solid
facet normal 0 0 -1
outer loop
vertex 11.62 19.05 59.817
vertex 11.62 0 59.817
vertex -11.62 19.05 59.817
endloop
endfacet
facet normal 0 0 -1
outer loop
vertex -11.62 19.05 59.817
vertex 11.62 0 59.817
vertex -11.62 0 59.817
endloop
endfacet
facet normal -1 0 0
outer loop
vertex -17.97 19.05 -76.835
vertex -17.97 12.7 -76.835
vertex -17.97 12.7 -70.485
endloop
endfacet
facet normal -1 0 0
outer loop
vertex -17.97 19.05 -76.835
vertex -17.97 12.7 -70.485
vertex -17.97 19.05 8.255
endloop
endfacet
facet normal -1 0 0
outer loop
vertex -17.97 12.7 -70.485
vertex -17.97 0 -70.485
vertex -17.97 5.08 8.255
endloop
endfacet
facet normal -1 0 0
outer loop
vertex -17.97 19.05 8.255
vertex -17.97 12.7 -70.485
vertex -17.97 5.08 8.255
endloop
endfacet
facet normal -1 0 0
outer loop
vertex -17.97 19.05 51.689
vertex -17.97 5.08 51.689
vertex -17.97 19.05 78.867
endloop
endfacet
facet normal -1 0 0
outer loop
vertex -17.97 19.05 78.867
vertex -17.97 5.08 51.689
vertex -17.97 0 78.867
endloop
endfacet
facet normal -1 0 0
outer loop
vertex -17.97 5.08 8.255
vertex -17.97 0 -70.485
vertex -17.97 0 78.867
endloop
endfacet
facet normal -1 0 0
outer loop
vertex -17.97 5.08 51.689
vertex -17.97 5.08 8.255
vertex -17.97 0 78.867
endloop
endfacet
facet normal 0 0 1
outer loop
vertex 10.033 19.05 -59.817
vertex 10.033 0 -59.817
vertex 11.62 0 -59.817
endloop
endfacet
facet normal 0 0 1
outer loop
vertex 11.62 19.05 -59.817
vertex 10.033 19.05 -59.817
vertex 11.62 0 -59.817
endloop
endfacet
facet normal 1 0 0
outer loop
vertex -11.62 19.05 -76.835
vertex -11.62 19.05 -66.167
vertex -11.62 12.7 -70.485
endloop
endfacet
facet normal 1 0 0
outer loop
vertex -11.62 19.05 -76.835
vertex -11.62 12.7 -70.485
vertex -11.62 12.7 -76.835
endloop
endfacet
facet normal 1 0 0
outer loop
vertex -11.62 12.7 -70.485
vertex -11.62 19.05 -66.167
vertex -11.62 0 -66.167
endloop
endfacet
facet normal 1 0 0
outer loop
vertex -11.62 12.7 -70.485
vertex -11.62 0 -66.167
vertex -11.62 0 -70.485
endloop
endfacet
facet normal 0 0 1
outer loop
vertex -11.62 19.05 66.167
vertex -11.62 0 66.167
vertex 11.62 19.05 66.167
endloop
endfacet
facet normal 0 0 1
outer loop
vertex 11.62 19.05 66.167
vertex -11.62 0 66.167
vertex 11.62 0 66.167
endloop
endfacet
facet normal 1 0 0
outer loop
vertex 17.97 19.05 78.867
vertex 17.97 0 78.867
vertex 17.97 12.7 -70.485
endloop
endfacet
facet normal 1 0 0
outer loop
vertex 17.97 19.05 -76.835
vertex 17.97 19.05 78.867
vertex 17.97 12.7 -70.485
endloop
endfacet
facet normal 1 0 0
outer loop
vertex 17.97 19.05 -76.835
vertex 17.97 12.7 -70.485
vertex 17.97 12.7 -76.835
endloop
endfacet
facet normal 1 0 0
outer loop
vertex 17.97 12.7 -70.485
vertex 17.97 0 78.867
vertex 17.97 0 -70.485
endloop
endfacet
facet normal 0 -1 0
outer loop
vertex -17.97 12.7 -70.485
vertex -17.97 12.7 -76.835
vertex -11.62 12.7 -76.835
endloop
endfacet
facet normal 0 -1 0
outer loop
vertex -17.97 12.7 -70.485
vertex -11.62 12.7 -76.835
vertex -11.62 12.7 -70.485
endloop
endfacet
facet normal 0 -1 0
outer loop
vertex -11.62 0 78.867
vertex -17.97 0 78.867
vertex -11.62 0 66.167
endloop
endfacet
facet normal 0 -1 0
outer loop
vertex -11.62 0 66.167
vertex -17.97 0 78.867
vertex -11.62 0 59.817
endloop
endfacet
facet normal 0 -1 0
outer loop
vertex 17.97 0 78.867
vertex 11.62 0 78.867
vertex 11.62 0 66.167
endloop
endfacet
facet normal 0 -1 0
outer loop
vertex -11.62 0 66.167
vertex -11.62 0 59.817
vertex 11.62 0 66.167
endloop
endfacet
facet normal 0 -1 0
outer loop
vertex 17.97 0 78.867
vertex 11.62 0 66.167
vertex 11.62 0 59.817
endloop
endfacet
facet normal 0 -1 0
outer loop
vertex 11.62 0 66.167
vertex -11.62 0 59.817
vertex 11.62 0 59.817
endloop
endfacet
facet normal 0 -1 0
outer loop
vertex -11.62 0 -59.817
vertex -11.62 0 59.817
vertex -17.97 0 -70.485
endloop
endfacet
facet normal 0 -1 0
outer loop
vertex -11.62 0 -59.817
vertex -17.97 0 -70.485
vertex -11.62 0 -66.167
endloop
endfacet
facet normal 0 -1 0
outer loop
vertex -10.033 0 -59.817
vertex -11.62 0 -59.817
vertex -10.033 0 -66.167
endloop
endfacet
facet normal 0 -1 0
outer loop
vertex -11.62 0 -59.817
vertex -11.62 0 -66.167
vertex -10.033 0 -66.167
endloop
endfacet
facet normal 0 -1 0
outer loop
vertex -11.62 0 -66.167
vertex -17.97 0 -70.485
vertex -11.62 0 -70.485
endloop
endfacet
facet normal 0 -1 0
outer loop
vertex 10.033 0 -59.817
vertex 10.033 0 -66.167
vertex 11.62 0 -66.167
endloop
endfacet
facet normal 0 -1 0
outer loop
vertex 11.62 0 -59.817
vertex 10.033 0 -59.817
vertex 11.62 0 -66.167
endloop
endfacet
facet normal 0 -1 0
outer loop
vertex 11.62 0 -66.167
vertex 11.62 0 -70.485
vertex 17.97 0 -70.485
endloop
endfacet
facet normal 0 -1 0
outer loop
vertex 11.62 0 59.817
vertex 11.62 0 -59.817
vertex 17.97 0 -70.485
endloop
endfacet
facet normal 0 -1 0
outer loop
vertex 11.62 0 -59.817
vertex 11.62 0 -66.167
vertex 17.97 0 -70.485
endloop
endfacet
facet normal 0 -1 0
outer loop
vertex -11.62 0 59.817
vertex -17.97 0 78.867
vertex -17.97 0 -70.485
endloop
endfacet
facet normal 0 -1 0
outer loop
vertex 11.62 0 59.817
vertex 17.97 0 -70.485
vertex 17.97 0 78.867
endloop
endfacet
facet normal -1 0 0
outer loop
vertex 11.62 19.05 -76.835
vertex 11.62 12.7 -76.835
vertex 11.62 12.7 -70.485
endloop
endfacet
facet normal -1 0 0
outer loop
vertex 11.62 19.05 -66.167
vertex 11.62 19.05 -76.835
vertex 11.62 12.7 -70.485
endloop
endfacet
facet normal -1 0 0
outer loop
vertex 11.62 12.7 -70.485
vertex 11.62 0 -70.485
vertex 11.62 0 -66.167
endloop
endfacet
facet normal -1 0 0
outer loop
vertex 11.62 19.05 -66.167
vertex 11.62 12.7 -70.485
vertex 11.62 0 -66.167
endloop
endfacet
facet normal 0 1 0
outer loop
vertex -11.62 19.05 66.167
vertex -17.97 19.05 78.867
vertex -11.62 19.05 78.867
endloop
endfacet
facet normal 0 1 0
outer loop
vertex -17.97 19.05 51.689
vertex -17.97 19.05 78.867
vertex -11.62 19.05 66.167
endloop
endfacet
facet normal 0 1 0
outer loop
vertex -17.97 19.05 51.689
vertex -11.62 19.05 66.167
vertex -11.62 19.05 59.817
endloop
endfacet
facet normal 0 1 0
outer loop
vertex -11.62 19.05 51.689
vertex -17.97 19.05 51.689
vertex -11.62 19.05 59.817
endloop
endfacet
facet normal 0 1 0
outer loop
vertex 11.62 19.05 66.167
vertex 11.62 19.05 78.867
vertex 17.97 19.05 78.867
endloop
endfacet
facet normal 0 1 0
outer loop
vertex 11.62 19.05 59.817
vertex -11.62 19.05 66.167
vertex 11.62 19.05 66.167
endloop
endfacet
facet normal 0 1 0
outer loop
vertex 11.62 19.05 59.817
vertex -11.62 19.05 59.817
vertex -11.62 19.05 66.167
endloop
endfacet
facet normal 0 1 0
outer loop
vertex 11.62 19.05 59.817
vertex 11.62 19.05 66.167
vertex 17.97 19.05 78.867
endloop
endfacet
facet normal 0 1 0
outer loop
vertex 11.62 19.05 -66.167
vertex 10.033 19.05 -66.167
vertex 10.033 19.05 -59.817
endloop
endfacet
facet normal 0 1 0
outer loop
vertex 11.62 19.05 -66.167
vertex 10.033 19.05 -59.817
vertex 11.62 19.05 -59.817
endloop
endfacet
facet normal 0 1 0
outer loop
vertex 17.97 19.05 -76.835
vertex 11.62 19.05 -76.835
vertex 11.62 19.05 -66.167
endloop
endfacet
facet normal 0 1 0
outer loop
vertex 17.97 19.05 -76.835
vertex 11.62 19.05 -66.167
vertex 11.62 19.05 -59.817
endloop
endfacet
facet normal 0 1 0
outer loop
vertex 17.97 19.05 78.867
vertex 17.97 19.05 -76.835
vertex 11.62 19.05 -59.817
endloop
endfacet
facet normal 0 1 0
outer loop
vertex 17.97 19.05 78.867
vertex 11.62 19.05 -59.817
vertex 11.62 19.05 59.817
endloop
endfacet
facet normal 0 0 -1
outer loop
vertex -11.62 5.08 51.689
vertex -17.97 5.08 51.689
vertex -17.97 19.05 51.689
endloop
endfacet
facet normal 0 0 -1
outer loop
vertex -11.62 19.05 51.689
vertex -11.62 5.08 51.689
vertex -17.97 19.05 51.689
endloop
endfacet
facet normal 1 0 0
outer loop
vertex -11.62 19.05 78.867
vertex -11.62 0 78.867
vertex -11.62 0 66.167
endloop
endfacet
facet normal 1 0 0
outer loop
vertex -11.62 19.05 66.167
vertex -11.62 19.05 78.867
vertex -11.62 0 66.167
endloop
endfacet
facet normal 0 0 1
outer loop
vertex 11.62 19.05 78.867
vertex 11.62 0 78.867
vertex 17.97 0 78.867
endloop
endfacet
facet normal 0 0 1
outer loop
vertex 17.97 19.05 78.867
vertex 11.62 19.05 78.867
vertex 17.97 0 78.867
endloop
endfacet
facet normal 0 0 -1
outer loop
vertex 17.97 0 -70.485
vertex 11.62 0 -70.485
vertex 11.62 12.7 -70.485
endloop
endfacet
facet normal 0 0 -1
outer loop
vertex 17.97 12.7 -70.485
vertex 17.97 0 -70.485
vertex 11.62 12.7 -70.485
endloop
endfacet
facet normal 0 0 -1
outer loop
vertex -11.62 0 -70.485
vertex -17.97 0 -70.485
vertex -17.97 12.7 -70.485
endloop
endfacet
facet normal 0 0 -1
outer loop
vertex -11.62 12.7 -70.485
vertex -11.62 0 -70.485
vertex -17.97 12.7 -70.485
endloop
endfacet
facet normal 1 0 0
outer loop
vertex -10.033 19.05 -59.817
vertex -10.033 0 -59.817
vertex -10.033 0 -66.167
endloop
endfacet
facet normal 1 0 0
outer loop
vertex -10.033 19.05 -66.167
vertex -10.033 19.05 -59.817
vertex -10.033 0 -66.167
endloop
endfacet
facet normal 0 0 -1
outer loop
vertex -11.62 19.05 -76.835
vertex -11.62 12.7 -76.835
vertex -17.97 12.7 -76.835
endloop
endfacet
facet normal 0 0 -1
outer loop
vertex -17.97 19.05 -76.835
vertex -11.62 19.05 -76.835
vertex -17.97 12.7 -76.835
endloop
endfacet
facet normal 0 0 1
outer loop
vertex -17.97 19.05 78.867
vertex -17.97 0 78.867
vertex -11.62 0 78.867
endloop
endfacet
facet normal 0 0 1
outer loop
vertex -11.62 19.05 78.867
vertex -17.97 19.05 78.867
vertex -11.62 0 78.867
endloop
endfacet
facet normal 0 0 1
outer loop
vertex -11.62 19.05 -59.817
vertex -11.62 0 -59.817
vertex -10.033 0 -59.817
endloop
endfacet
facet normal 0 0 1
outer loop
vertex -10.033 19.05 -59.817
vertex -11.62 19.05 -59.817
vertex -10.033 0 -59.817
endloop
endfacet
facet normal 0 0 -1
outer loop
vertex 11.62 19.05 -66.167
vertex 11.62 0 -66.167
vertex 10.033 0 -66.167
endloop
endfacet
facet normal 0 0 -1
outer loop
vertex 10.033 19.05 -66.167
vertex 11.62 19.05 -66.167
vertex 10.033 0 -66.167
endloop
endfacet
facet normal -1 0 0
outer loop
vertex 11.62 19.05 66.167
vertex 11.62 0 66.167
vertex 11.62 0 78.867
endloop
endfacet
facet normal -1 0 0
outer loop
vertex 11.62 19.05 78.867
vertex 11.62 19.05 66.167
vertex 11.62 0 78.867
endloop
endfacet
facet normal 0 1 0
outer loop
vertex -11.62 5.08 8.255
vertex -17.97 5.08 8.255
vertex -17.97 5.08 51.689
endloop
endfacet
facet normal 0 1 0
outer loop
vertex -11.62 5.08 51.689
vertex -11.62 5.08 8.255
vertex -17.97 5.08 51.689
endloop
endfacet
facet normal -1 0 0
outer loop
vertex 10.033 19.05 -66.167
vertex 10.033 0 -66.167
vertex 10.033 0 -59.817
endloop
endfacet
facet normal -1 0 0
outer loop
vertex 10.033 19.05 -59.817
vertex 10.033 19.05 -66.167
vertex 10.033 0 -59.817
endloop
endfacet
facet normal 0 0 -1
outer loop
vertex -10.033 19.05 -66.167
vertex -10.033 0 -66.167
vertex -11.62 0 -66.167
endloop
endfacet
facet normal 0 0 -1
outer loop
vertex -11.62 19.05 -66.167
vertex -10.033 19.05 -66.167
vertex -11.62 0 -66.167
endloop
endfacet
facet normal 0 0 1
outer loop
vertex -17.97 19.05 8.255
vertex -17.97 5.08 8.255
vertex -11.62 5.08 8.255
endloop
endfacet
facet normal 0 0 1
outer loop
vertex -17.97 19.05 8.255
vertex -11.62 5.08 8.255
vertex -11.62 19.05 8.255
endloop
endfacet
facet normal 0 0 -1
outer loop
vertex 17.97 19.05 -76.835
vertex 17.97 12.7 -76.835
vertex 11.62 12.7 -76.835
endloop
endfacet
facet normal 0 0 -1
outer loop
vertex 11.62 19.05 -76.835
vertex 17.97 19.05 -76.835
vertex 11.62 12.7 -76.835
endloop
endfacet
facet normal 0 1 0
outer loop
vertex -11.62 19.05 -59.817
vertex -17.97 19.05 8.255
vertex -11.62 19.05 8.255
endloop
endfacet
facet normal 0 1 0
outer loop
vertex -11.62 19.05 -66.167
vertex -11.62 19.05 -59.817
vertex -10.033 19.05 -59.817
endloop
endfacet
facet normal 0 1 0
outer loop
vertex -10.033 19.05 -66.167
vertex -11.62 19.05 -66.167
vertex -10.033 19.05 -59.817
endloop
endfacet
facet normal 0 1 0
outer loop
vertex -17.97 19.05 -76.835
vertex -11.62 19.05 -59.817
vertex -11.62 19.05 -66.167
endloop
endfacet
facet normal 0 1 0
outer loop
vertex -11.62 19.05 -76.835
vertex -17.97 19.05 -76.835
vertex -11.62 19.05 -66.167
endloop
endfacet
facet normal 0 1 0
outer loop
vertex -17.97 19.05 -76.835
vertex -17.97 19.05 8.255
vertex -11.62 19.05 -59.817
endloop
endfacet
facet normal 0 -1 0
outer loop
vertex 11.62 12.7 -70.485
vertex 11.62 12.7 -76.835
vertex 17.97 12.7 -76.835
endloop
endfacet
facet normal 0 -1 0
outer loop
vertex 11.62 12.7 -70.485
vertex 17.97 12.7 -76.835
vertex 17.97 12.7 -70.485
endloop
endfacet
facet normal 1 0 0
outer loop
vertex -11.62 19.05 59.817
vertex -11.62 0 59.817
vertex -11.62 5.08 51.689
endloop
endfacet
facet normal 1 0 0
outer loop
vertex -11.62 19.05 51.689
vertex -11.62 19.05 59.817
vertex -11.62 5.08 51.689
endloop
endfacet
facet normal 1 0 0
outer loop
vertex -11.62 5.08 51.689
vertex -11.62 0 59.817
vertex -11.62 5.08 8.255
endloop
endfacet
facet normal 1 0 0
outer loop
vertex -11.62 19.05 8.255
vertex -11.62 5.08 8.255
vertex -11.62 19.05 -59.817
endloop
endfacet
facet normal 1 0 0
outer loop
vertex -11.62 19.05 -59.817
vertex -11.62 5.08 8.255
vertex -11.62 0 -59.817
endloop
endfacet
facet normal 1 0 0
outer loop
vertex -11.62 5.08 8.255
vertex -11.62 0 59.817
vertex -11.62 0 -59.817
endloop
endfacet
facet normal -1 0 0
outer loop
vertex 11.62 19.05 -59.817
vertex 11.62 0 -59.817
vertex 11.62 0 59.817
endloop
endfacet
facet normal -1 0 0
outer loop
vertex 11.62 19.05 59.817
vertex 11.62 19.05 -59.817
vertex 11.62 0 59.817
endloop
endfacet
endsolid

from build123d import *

# Parameters (mm, degrees)
BOSS_EXTRUDE1_DEPTH = 19.05
SKETCH2_W           = 43.434
SKETCH2_H           = 13.97
MOTOR_HOLE_DEPTH    = 19.05
SKETCH3_W           = 6.35
SKETCH3_H           = 12.7
CUT_EXTRUDE2_DEPTH  = 36.941


with BuildPart() as part:
    # Sketch1 → Boss-Extrude1 (new body)
    with BuildSketch(Plane(origin=(0, 0, 0), x_dir=(1, 0, 0), z_dir=(0, 1, 0))):
        Polygon((-10.033, 66.167), (-11.6205, 66.167), (-11.6205, 76.835), (-17.9705, 76.835), (-17.9705, -78.867), (-11.6205, -78.867), (-11.6205, -66.167), (11.6205, -66.167), (11.6205, -78.867), (17.9705, -78.867), (17.9705, 76.835), (11.6205, 76.835), (11.6205, 66.167), (10.033, 66.167), (10.033, 59.817), (11.6205, 59.817), (11.6205, -59.817), (-11.6205, -59.817), (-11.6205, 59.817), (-10.033, 59.817), align=None)
    extrude(amount=BOSS_EXTRUDE1_DEPTH)

    # Sketch2 → Motor Hole (cut)
    with BuildSketch(Plane.ZY.offset(17.9705)):
        with Locations((29.972, 12.065)):
            Rectangle(SKETCH2_W, SKETCH2_H)
    extrude(amount=-MOTOR_HOLE_DEPTH, mode=Mode.SUBTRACT)

    # Sketch3 → Cut-Extrude2 (cut, through all)
    with BuildSketch(Plane.ZY.offset(17.9705)):
        with Locations((-73.66, 6.35)):
            Rectangle(SKETCH3_W, SKETCH3_H)
    extrude(amount=-CUT_EXTRUDE2_DEPTH, mode=Mode.SUBTRACT)


solid = part.part
